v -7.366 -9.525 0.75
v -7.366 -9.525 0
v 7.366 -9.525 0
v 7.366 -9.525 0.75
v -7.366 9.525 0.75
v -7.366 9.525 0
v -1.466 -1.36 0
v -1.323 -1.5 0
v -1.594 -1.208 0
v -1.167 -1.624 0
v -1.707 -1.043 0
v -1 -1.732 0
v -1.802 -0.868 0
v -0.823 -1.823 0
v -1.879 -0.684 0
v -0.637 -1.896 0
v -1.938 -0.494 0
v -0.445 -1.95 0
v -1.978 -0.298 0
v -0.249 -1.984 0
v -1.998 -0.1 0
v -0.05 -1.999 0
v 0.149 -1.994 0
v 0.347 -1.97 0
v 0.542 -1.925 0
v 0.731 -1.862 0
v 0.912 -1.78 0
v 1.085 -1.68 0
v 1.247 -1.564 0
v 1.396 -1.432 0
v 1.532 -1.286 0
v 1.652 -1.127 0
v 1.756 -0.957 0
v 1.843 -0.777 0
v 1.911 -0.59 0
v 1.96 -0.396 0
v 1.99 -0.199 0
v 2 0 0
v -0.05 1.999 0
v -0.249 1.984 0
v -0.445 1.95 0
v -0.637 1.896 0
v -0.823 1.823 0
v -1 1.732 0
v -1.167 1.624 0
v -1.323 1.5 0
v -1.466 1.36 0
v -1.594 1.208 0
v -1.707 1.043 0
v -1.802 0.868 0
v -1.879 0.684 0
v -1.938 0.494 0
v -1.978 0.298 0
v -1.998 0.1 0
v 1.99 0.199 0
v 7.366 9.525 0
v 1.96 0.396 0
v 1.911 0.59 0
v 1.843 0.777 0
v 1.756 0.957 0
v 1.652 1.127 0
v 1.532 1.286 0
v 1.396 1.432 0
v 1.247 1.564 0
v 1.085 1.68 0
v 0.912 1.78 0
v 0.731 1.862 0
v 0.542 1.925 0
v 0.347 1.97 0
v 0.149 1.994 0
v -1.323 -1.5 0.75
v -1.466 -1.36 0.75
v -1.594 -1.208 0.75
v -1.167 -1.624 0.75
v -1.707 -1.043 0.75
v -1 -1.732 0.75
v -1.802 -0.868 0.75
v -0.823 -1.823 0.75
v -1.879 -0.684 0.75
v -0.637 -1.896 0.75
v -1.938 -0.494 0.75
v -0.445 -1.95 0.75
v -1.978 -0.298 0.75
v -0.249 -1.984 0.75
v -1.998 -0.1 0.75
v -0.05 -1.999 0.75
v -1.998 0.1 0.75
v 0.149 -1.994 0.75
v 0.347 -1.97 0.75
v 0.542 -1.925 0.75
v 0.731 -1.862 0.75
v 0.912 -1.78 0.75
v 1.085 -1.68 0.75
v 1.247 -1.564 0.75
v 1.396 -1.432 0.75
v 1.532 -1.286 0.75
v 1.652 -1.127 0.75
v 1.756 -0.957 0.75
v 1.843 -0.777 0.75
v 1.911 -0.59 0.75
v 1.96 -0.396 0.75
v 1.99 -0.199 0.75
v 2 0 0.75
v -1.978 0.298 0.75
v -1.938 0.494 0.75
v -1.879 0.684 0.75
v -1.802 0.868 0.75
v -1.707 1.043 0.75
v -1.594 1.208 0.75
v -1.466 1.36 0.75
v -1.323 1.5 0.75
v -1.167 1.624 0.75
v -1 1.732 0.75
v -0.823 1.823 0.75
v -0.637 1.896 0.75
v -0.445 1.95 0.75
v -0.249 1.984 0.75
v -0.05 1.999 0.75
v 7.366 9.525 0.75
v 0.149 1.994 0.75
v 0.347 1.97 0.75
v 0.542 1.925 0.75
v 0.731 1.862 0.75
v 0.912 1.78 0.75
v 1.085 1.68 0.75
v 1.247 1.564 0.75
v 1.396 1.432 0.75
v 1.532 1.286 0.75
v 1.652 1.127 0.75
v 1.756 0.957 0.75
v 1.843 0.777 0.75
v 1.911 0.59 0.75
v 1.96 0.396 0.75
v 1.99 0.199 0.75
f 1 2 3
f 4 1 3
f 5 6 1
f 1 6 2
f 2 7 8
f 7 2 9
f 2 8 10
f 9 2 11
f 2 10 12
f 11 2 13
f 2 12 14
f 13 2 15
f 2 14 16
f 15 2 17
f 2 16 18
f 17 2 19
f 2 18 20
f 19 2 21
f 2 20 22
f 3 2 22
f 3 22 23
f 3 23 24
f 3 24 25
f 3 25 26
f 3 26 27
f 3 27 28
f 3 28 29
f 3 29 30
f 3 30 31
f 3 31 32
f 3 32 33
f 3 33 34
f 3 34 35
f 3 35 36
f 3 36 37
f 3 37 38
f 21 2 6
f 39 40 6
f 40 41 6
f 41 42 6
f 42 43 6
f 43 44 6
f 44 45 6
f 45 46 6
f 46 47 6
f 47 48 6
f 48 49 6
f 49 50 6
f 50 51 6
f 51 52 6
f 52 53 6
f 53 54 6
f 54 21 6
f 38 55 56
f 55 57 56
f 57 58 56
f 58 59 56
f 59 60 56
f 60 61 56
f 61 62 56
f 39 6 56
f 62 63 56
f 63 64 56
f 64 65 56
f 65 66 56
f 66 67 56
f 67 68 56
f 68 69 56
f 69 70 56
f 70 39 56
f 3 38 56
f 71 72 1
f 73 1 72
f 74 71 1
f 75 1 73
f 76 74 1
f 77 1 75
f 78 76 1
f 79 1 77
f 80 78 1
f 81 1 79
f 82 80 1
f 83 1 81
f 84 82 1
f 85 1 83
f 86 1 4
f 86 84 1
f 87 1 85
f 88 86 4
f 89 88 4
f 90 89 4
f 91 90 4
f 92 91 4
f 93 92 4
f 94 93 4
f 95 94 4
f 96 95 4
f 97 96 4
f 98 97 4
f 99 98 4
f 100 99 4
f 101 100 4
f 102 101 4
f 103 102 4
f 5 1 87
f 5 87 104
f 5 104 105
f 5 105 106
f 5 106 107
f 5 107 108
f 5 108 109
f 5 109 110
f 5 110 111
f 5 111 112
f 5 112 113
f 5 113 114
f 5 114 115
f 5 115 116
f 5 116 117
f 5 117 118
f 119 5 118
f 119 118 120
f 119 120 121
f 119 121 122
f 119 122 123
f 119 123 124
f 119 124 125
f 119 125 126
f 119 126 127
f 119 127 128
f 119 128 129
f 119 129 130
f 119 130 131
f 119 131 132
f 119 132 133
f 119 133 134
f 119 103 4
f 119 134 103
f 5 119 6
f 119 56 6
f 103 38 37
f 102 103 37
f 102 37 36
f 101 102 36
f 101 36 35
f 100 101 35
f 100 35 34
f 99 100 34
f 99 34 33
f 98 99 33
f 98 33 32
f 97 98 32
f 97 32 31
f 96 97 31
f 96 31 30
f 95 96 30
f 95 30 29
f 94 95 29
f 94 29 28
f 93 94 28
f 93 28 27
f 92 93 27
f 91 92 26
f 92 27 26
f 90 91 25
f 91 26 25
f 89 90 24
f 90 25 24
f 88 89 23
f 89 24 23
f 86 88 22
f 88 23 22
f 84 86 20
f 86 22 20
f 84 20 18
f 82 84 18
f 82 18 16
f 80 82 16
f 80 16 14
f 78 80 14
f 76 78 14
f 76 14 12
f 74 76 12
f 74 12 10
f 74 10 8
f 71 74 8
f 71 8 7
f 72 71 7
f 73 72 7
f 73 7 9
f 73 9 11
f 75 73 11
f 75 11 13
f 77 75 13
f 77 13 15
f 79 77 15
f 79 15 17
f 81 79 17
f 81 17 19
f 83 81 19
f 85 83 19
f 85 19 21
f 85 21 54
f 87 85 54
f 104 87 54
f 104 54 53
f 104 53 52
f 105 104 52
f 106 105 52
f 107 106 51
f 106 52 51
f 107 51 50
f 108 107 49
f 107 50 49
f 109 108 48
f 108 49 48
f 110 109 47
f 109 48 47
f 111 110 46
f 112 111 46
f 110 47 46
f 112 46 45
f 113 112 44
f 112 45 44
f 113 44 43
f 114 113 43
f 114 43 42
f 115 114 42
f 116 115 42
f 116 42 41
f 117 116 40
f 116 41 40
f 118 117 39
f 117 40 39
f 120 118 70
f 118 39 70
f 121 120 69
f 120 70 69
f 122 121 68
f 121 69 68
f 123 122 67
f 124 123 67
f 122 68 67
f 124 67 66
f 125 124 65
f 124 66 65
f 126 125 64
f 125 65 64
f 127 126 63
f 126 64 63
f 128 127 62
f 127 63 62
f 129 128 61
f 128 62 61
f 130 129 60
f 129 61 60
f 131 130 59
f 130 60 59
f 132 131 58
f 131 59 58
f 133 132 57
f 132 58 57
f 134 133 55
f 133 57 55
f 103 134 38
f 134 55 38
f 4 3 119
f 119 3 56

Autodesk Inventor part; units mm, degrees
ref_plane "YZ Plane" through (0, 0, 0) normal (1, 0, 0) x (0, 1, 0)
ref_plane "XZ Plane" through (0, 0, 0) normal (0, 1, 0) x (-1, 0, 0)
ref_plane "XY Plane" through (0, 0, 0) normal (0, 0, 1) x (1, 0, 0)
sketch "Sketch1" plane through (0, 0, 0) normal (0, 0, 1) x (1, 0, 0)
  circle A0 centre (0, 0) radius 2
  line L0 (0, 0) -> (7.366, 0)
  line L1 (0, 0) -> (-7.366, 0)
  line L2 (7.366, 0) -> (7.366, 9.525)
  line L3 (-7.366, 0) -> (-7.366, -9.525)
  line L4 (-7.366, -9.525) -> (7.366, -9.525)
  line L5 (7.366, -9.525) -> (7.366, 9.525)
  line L6 (7.366, 9.525) -> (-7.366, 9.525)
  line L7 (-7.366, 9.525) -> (-7.366, -9.525)
  point P0 (7.366, 0)
  dimension "d0" = 4
  dimension "d1" = 7.366
  dimension "d2" = 7.366
  dimension "d3" = 9.525
  dimension "d4" = 9.525
extrude "Extrusion1" add sketch "Sketch1" along normal blind 0.75 contours L0 L5 L4 L3 L1 A0 | A0 L1 L7 L6 L2 L0
equation "\"d2\" = d1"
equation "\"d4\" = d3"
properties part number "MotorProtector"
